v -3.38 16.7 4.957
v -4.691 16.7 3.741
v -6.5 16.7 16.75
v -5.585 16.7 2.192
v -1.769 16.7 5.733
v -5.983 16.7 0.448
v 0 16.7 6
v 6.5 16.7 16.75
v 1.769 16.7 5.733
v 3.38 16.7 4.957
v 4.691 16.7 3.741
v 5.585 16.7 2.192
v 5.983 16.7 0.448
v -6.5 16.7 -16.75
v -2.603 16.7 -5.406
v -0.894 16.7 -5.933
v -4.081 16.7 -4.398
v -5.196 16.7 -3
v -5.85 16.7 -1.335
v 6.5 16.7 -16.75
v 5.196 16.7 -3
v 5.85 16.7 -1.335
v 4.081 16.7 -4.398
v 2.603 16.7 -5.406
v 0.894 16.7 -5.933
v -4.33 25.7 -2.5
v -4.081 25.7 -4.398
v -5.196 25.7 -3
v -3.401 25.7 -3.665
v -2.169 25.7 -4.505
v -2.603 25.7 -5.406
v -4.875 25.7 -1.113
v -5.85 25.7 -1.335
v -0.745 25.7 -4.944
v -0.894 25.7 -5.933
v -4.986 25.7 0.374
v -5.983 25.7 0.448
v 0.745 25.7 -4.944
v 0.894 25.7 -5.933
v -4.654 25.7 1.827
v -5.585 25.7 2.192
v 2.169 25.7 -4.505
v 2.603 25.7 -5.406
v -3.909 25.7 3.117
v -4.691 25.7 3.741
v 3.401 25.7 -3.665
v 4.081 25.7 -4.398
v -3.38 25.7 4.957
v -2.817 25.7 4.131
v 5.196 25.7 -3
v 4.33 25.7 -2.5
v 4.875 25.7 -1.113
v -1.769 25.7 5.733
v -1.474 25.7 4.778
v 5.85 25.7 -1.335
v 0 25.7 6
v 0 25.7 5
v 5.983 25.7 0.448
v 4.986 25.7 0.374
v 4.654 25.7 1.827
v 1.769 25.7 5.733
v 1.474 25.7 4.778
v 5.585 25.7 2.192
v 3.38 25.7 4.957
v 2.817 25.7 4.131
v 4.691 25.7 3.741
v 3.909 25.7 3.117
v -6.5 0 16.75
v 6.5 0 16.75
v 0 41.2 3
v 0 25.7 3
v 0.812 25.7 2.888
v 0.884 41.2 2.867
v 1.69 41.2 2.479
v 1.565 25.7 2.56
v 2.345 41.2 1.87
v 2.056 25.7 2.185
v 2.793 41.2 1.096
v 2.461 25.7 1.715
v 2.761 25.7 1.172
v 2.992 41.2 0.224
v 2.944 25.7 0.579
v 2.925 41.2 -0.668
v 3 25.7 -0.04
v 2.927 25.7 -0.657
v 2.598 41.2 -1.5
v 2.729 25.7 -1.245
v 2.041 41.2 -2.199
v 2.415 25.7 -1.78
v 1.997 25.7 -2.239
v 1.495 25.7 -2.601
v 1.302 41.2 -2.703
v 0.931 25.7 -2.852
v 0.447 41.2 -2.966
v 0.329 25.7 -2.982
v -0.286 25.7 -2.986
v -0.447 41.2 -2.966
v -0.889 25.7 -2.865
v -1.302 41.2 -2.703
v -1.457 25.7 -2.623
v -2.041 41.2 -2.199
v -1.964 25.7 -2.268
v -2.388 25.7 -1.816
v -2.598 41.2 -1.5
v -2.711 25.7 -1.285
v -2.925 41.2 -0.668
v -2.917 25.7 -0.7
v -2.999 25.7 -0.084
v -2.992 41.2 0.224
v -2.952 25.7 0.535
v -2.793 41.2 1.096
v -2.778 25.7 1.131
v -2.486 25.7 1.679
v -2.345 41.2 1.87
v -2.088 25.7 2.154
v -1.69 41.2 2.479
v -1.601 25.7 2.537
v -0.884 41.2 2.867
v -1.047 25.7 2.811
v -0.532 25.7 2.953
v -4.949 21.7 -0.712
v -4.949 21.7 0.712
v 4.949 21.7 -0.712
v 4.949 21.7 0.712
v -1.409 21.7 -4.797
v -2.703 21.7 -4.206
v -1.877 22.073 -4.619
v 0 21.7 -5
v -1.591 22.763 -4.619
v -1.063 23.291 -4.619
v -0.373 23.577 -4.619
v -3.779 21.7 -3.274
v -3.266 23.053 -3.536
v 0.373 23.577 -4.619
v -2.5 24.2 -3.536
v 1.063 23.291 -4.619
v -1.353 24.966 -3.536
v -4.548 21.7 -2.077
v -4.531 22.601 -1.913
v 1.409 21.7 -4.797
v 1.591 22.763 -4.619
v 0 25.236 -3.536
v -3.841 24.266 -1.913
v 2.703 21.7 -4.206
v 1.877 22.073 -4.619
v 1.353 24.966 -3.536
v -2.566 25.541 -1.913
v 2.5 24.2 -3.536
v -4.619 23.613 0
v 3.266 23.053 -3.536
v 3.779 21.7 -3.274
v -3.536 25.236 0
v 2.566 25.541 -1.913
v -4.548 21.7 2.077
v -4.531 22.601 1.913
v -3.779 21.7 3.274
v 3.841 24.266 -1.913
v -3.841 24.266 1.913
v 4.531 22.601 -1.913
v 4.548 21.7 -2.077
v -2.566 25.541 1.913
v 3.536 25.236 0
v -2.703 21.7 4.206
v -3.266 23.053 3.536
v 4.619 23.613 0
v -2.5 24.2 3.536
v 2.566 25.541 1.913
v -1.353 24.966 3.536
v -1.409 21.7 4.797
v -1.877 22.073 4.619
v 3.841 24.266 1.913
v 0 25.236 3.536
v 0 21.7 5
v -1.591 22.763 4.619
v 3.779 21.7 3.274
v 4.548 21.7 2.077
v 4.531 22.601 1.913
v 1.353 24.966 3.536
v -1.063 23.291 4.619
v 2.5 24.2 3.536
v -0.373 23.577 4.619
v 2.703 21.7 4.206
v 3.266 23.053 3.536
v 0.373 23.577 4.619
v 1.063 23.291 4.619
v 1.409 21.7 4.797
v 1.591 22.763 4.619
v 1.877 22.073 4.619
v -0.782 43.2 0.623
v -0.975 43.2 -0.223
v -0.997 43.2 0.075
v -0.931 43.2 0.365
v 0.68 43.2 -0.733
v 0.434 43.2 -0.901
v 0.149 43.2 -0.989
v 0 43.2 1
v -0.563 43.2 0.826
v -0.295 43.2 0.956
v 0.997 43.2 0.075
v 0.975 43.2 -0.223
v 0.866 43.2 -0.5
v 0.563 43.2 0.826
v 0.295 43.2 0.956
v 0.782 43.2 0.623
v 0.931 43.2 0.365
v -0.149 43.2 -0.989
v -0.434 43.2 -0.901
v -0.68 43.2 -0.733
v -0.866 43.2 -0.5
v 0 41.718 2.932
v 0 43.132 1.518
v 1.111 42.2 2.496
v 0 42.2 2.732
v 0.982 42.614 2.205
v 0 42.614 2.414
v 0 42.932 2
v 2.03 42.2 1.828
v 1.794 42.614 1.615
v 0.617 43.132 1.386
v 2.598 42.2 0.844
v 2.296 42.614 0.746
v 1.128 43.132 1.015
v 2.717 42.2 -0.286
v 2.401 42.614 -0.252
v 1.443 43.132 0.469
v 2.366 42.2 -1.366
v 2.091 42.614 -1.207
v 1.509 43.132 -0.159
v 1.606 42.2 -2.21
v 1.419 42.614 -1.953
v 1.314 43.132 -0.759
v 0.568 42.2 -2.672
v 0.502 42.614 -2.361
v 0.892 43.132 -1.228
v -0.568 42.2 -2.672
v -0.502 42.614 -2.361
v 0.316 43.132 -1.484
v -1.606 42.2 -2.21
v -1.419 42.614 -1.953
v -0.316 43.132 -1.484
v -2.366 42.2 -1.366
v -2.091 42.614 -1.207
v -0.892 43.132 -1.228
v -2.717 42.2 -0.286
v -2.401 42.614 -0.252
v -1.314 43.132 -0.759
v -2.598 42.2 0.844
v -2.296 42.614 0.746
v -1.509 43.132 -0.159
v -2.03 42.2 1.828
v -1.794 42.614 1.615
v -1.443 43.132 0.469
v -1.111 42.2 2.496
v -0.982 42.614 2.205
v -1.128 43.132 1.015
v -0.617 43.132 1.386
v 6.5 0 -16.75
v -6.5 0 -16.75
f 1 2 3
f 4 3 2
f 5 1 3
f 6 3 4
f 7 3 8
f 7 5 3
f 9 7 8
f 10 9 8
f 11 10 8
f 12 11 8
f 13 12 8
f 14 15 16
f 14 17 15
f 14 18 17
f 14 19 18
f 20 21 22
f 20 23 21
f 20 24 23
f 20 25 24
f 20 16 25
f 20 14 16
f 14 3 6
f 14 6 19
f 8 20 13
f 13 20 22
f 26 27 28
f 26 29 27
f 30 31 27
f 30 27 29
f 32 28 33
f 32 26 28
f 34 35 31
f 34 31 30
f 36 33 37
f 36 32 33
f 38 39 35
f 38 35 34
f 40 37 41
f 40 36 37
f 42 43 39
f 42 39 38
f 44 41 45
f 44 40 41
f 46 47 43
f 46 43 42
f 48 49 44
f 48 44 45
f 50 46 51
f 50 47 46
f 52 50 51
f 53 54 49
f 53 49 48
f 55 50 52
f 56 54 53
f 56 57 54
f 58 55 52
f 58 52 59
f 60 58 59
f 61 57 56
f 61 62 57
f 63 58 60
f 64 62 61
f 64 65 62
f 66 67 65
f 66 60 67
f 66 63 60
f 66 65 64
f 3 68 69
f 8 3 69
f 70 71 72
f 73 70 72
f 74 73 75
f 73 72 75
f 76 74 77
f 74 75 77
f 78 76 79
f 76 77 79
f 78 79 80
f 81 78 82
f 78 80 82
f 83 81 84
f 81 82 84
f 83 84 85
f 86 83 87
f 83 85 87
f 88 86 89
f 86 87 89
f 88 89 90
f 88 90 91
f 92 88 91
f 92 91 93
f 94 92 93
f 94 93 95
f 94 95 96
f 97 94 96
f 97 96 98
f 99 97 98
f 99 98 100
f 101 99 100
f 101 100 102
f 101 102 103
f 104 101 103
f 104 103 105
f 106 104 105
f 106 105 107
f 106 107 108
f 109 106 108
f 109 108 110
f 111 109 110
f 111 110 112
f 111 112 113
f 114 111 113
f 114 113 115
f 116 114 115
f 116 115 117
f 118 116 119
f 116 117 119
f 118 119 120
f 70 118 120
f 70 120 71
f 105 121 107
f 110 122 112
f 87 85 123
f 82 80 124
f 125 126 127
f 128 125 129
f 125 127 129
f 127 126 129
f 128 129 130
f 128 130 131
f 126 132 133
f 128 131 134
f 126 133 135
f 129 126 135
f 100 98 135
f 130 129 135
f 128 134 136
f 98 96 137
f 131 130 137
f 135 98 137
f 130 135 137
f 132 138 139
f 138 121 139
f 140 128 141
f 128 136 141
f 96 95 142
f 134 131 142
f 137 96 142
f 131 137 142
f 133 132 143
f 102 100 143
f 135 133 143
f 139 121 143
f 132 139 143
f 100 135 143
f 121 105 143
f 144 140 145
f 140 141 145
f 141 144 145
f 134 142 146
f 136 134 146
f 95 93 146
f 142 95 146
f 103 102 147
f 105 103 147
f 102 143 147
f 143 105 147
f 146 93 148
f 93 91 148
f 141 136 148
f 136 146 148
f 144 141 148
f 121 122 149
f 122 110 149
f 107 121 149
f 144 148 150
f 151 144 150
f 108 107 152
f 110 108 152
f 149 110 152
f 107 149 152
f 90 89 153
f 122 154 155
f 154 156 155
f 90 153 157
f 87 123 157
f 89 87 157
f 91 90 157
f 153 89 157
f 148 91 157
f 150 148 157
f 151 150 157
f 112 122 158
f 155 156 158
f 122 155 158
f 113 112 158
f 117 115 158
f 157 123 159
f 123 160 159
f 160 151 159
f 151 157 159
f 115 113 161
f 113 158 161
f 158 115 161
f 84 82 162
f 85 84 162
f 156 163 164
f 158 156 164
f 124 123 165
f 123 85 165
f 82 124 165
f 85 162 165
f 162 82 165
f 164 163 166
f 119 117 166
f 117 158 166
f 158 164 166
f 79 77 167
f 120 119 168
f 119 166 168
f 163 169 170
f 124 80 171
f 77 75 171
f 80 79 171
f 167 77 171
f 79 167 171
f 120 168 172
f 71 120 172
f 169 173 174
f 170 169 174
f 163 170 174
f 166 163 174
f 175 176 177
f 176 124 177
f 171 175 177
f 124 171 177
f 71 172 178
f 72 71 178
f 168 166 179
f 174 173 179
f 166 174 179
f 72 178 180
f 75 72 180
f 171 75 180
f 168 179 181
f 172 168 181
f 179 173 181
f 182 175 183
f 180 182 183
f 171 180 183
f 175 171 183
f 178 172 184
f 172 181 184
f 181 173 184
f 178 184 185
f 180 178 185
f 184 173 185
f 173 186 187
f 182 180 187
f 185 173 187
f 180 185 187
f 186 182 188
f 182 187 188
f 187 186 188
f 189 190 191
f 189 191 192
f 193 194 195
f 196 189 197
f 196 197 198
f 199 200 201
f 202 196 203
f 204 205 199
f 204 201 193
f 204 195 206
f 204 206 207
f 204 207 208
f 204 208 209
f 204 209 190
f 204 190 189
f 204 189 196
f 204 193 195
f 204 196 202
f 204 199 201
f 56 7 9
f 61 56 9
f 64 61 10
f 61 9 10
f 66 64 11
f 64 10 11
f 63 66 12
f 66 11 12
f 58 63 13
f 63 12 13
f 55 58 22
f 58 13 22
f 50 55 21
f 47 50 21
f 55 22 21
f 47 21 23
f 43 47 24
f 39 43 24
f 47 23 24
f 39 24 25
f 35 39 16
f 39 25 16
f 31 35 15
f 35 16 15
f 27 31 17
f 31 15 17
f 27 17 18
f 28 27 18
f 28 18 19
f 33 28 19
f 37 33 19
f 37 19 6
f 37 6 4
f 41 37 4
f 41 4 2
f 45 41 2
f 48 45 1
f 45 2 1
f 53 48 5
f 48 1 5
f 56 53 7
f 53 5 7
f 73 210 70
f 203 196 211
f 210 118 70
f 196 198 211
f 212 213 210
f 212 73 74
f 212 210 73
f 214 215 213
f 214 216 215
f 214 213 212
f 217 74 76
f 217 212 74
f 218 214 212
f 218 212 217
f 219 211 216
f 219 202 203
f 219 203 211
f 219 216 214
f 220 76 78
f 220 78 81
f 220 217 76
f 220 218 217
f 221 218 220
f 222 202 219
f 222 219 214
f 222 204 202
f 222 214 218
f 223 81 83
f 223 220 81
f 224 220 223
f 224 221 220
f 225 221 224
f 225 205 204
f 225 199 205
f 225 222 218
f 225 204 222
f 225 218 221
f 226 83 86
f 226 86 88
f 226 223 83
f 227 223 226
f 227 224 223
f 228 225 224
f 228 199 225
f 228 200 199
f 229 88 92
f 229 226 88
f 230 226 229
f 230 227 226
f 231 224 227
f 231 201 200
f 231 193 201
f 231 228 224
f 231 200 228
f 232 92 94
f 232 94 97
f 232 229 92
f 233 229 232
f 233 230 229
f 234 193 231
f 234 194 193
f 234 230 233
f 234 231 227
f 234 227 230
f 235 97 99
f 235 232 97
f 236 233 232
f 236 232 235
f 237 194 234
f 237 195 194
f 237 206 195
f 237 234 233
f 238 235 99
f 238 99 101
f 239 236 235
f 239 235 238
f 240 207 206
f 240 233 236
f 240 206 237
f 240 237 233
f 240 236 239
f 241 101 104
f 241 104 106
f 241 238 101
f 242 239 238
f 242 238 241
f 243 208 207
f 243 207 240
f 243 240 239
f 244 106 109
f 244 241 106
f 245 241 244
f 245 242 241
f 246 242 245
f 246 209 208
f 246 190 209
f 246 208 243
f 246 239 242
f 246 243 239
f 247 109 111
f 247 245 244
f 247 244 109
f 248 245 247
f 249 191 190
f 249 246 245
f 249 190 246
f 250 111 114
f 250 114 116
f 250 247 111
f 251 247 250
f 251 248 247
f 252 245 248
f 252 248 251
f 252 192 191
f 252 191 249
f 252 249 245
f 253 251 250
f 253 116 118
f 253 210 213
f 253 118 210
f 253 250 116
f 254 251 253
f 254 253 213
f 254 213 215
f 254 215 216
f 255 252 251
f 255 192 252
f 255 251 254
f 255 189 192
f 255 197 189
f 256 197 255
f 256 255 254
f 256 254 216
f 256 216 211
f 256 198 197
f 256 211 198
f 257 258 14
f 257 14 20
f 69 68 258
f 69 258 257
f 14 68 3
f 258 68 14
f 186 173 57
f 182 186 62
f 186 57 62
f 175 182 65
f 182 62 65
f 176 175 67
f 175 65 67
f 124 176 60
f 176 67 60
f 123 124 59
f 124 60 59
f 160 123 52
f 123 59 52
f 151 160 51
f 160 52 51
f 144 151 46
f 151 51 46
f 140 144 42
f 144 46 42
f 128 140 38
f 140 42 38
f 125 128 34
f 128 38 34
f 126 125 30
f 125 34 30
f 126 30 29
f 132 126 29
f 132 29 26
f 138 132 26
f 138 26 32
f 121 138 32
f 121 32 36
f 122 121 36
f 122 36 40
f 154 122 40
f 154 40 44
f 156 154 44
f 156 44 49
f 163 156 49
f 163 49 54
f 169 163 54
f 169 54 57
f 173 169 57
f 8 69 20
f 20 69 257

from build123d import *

# Parameters (mm, degrees)
SKETCH1_W           = 13
SKETCH1_H           = 33.5
BOSS_EXTRUDE1_DEPTH = 16.7
SKETCH2_R           = 6
BOSS_EXTRUDE2_DEPTH = 9
SKETCH4_R           = 5
CUT_EXTRUDE1_DEPTH  = 4
SKETCH5_R           = 3
BOSS_EXTRUDE3_DEPTH = 21.5
REVOLVE2_ANGLE      = 180
FILLET1_R           = 2


with BuildPart() as part:
    # Sketch1 → Boss-Extrude1 (new body)
    with BuildSketch(Plane(origin=(0, 0, 0), x_dir=(1, 0, 0), z_dir=(0, 1, 0))):
        Rectangle(SKETCH1_W, SKETCH1_H)
    extrude(amount=BOSS_EXTRUDE1_DEPTH)

    # Sketch2 → Boss-Extrude2 (add)
    with BuildSketch(Plane(origin=(0, 16.7, 0), x_dir=(1, 0, 0), z_dir=(0, 1, 0))):
        with Locations(Location((0, 0, 0), (0, 0, 270))):  # turned: the seam where the file's is
            Circle(SKETCH2_R)
    extrude(amount=BOSS_EXTRUDE2_DEPTH)

    # Sketch4 → Cut-Extrude1 (cut)
    with BuildSketch(Plane(origin=(0, 25.7, 0), x_dir=(1, 0, 0), z_dir=(0, 1, 0))):
        with Locations(Location((0, 0, 0), (0, 0, 270))):  # turned: the seam where the file's is
            Circle(SKETCH4_R)
    extrude(amount=-CUT_EXTRUDE1_DEPTH, mode=Mode.SUBTRACT)

    # Sketch5 → Boss-Extrude3 (add)
    with BuildSketch(Plane(origin=(0, 21.7, 0), x_dir=(1, 0, 0), z_dir=(0, 1, 0))):
        with Locations(Location((0, 0, 0), (0, 0, 270))):  # turned: the seam where the file's is
            Circle(SKETCH5_R)
    extrude(amount=BOSS_EXTRUDE3_DEPTH)

    # Sketch3 → Revolve2 (revolve)
    with BuildSketch(Plane(origin=(0, 21.7, 0), x_dir=(1, 0, 0), z_dir=(0, 1, 0))):
        with BuildLine():
            Line((0, -5), (0, 5))
            ThreePointArc((0, 5), (-5, 0), (0, -5))
        make_face()
    revolve(axis=Axis((0, 21.7, 6), (0, 0, -1)), revolution_arc=REVOLVE2_ANGLE)

    # Fillet1
    fillet1_edges = [part.edges().sort_by_distance(p)[0] for p in [
        (0, 43.2, -3),
    ]]
    fillet(fillet1_edges, radius=FILLET1_R)


solid = part.part
